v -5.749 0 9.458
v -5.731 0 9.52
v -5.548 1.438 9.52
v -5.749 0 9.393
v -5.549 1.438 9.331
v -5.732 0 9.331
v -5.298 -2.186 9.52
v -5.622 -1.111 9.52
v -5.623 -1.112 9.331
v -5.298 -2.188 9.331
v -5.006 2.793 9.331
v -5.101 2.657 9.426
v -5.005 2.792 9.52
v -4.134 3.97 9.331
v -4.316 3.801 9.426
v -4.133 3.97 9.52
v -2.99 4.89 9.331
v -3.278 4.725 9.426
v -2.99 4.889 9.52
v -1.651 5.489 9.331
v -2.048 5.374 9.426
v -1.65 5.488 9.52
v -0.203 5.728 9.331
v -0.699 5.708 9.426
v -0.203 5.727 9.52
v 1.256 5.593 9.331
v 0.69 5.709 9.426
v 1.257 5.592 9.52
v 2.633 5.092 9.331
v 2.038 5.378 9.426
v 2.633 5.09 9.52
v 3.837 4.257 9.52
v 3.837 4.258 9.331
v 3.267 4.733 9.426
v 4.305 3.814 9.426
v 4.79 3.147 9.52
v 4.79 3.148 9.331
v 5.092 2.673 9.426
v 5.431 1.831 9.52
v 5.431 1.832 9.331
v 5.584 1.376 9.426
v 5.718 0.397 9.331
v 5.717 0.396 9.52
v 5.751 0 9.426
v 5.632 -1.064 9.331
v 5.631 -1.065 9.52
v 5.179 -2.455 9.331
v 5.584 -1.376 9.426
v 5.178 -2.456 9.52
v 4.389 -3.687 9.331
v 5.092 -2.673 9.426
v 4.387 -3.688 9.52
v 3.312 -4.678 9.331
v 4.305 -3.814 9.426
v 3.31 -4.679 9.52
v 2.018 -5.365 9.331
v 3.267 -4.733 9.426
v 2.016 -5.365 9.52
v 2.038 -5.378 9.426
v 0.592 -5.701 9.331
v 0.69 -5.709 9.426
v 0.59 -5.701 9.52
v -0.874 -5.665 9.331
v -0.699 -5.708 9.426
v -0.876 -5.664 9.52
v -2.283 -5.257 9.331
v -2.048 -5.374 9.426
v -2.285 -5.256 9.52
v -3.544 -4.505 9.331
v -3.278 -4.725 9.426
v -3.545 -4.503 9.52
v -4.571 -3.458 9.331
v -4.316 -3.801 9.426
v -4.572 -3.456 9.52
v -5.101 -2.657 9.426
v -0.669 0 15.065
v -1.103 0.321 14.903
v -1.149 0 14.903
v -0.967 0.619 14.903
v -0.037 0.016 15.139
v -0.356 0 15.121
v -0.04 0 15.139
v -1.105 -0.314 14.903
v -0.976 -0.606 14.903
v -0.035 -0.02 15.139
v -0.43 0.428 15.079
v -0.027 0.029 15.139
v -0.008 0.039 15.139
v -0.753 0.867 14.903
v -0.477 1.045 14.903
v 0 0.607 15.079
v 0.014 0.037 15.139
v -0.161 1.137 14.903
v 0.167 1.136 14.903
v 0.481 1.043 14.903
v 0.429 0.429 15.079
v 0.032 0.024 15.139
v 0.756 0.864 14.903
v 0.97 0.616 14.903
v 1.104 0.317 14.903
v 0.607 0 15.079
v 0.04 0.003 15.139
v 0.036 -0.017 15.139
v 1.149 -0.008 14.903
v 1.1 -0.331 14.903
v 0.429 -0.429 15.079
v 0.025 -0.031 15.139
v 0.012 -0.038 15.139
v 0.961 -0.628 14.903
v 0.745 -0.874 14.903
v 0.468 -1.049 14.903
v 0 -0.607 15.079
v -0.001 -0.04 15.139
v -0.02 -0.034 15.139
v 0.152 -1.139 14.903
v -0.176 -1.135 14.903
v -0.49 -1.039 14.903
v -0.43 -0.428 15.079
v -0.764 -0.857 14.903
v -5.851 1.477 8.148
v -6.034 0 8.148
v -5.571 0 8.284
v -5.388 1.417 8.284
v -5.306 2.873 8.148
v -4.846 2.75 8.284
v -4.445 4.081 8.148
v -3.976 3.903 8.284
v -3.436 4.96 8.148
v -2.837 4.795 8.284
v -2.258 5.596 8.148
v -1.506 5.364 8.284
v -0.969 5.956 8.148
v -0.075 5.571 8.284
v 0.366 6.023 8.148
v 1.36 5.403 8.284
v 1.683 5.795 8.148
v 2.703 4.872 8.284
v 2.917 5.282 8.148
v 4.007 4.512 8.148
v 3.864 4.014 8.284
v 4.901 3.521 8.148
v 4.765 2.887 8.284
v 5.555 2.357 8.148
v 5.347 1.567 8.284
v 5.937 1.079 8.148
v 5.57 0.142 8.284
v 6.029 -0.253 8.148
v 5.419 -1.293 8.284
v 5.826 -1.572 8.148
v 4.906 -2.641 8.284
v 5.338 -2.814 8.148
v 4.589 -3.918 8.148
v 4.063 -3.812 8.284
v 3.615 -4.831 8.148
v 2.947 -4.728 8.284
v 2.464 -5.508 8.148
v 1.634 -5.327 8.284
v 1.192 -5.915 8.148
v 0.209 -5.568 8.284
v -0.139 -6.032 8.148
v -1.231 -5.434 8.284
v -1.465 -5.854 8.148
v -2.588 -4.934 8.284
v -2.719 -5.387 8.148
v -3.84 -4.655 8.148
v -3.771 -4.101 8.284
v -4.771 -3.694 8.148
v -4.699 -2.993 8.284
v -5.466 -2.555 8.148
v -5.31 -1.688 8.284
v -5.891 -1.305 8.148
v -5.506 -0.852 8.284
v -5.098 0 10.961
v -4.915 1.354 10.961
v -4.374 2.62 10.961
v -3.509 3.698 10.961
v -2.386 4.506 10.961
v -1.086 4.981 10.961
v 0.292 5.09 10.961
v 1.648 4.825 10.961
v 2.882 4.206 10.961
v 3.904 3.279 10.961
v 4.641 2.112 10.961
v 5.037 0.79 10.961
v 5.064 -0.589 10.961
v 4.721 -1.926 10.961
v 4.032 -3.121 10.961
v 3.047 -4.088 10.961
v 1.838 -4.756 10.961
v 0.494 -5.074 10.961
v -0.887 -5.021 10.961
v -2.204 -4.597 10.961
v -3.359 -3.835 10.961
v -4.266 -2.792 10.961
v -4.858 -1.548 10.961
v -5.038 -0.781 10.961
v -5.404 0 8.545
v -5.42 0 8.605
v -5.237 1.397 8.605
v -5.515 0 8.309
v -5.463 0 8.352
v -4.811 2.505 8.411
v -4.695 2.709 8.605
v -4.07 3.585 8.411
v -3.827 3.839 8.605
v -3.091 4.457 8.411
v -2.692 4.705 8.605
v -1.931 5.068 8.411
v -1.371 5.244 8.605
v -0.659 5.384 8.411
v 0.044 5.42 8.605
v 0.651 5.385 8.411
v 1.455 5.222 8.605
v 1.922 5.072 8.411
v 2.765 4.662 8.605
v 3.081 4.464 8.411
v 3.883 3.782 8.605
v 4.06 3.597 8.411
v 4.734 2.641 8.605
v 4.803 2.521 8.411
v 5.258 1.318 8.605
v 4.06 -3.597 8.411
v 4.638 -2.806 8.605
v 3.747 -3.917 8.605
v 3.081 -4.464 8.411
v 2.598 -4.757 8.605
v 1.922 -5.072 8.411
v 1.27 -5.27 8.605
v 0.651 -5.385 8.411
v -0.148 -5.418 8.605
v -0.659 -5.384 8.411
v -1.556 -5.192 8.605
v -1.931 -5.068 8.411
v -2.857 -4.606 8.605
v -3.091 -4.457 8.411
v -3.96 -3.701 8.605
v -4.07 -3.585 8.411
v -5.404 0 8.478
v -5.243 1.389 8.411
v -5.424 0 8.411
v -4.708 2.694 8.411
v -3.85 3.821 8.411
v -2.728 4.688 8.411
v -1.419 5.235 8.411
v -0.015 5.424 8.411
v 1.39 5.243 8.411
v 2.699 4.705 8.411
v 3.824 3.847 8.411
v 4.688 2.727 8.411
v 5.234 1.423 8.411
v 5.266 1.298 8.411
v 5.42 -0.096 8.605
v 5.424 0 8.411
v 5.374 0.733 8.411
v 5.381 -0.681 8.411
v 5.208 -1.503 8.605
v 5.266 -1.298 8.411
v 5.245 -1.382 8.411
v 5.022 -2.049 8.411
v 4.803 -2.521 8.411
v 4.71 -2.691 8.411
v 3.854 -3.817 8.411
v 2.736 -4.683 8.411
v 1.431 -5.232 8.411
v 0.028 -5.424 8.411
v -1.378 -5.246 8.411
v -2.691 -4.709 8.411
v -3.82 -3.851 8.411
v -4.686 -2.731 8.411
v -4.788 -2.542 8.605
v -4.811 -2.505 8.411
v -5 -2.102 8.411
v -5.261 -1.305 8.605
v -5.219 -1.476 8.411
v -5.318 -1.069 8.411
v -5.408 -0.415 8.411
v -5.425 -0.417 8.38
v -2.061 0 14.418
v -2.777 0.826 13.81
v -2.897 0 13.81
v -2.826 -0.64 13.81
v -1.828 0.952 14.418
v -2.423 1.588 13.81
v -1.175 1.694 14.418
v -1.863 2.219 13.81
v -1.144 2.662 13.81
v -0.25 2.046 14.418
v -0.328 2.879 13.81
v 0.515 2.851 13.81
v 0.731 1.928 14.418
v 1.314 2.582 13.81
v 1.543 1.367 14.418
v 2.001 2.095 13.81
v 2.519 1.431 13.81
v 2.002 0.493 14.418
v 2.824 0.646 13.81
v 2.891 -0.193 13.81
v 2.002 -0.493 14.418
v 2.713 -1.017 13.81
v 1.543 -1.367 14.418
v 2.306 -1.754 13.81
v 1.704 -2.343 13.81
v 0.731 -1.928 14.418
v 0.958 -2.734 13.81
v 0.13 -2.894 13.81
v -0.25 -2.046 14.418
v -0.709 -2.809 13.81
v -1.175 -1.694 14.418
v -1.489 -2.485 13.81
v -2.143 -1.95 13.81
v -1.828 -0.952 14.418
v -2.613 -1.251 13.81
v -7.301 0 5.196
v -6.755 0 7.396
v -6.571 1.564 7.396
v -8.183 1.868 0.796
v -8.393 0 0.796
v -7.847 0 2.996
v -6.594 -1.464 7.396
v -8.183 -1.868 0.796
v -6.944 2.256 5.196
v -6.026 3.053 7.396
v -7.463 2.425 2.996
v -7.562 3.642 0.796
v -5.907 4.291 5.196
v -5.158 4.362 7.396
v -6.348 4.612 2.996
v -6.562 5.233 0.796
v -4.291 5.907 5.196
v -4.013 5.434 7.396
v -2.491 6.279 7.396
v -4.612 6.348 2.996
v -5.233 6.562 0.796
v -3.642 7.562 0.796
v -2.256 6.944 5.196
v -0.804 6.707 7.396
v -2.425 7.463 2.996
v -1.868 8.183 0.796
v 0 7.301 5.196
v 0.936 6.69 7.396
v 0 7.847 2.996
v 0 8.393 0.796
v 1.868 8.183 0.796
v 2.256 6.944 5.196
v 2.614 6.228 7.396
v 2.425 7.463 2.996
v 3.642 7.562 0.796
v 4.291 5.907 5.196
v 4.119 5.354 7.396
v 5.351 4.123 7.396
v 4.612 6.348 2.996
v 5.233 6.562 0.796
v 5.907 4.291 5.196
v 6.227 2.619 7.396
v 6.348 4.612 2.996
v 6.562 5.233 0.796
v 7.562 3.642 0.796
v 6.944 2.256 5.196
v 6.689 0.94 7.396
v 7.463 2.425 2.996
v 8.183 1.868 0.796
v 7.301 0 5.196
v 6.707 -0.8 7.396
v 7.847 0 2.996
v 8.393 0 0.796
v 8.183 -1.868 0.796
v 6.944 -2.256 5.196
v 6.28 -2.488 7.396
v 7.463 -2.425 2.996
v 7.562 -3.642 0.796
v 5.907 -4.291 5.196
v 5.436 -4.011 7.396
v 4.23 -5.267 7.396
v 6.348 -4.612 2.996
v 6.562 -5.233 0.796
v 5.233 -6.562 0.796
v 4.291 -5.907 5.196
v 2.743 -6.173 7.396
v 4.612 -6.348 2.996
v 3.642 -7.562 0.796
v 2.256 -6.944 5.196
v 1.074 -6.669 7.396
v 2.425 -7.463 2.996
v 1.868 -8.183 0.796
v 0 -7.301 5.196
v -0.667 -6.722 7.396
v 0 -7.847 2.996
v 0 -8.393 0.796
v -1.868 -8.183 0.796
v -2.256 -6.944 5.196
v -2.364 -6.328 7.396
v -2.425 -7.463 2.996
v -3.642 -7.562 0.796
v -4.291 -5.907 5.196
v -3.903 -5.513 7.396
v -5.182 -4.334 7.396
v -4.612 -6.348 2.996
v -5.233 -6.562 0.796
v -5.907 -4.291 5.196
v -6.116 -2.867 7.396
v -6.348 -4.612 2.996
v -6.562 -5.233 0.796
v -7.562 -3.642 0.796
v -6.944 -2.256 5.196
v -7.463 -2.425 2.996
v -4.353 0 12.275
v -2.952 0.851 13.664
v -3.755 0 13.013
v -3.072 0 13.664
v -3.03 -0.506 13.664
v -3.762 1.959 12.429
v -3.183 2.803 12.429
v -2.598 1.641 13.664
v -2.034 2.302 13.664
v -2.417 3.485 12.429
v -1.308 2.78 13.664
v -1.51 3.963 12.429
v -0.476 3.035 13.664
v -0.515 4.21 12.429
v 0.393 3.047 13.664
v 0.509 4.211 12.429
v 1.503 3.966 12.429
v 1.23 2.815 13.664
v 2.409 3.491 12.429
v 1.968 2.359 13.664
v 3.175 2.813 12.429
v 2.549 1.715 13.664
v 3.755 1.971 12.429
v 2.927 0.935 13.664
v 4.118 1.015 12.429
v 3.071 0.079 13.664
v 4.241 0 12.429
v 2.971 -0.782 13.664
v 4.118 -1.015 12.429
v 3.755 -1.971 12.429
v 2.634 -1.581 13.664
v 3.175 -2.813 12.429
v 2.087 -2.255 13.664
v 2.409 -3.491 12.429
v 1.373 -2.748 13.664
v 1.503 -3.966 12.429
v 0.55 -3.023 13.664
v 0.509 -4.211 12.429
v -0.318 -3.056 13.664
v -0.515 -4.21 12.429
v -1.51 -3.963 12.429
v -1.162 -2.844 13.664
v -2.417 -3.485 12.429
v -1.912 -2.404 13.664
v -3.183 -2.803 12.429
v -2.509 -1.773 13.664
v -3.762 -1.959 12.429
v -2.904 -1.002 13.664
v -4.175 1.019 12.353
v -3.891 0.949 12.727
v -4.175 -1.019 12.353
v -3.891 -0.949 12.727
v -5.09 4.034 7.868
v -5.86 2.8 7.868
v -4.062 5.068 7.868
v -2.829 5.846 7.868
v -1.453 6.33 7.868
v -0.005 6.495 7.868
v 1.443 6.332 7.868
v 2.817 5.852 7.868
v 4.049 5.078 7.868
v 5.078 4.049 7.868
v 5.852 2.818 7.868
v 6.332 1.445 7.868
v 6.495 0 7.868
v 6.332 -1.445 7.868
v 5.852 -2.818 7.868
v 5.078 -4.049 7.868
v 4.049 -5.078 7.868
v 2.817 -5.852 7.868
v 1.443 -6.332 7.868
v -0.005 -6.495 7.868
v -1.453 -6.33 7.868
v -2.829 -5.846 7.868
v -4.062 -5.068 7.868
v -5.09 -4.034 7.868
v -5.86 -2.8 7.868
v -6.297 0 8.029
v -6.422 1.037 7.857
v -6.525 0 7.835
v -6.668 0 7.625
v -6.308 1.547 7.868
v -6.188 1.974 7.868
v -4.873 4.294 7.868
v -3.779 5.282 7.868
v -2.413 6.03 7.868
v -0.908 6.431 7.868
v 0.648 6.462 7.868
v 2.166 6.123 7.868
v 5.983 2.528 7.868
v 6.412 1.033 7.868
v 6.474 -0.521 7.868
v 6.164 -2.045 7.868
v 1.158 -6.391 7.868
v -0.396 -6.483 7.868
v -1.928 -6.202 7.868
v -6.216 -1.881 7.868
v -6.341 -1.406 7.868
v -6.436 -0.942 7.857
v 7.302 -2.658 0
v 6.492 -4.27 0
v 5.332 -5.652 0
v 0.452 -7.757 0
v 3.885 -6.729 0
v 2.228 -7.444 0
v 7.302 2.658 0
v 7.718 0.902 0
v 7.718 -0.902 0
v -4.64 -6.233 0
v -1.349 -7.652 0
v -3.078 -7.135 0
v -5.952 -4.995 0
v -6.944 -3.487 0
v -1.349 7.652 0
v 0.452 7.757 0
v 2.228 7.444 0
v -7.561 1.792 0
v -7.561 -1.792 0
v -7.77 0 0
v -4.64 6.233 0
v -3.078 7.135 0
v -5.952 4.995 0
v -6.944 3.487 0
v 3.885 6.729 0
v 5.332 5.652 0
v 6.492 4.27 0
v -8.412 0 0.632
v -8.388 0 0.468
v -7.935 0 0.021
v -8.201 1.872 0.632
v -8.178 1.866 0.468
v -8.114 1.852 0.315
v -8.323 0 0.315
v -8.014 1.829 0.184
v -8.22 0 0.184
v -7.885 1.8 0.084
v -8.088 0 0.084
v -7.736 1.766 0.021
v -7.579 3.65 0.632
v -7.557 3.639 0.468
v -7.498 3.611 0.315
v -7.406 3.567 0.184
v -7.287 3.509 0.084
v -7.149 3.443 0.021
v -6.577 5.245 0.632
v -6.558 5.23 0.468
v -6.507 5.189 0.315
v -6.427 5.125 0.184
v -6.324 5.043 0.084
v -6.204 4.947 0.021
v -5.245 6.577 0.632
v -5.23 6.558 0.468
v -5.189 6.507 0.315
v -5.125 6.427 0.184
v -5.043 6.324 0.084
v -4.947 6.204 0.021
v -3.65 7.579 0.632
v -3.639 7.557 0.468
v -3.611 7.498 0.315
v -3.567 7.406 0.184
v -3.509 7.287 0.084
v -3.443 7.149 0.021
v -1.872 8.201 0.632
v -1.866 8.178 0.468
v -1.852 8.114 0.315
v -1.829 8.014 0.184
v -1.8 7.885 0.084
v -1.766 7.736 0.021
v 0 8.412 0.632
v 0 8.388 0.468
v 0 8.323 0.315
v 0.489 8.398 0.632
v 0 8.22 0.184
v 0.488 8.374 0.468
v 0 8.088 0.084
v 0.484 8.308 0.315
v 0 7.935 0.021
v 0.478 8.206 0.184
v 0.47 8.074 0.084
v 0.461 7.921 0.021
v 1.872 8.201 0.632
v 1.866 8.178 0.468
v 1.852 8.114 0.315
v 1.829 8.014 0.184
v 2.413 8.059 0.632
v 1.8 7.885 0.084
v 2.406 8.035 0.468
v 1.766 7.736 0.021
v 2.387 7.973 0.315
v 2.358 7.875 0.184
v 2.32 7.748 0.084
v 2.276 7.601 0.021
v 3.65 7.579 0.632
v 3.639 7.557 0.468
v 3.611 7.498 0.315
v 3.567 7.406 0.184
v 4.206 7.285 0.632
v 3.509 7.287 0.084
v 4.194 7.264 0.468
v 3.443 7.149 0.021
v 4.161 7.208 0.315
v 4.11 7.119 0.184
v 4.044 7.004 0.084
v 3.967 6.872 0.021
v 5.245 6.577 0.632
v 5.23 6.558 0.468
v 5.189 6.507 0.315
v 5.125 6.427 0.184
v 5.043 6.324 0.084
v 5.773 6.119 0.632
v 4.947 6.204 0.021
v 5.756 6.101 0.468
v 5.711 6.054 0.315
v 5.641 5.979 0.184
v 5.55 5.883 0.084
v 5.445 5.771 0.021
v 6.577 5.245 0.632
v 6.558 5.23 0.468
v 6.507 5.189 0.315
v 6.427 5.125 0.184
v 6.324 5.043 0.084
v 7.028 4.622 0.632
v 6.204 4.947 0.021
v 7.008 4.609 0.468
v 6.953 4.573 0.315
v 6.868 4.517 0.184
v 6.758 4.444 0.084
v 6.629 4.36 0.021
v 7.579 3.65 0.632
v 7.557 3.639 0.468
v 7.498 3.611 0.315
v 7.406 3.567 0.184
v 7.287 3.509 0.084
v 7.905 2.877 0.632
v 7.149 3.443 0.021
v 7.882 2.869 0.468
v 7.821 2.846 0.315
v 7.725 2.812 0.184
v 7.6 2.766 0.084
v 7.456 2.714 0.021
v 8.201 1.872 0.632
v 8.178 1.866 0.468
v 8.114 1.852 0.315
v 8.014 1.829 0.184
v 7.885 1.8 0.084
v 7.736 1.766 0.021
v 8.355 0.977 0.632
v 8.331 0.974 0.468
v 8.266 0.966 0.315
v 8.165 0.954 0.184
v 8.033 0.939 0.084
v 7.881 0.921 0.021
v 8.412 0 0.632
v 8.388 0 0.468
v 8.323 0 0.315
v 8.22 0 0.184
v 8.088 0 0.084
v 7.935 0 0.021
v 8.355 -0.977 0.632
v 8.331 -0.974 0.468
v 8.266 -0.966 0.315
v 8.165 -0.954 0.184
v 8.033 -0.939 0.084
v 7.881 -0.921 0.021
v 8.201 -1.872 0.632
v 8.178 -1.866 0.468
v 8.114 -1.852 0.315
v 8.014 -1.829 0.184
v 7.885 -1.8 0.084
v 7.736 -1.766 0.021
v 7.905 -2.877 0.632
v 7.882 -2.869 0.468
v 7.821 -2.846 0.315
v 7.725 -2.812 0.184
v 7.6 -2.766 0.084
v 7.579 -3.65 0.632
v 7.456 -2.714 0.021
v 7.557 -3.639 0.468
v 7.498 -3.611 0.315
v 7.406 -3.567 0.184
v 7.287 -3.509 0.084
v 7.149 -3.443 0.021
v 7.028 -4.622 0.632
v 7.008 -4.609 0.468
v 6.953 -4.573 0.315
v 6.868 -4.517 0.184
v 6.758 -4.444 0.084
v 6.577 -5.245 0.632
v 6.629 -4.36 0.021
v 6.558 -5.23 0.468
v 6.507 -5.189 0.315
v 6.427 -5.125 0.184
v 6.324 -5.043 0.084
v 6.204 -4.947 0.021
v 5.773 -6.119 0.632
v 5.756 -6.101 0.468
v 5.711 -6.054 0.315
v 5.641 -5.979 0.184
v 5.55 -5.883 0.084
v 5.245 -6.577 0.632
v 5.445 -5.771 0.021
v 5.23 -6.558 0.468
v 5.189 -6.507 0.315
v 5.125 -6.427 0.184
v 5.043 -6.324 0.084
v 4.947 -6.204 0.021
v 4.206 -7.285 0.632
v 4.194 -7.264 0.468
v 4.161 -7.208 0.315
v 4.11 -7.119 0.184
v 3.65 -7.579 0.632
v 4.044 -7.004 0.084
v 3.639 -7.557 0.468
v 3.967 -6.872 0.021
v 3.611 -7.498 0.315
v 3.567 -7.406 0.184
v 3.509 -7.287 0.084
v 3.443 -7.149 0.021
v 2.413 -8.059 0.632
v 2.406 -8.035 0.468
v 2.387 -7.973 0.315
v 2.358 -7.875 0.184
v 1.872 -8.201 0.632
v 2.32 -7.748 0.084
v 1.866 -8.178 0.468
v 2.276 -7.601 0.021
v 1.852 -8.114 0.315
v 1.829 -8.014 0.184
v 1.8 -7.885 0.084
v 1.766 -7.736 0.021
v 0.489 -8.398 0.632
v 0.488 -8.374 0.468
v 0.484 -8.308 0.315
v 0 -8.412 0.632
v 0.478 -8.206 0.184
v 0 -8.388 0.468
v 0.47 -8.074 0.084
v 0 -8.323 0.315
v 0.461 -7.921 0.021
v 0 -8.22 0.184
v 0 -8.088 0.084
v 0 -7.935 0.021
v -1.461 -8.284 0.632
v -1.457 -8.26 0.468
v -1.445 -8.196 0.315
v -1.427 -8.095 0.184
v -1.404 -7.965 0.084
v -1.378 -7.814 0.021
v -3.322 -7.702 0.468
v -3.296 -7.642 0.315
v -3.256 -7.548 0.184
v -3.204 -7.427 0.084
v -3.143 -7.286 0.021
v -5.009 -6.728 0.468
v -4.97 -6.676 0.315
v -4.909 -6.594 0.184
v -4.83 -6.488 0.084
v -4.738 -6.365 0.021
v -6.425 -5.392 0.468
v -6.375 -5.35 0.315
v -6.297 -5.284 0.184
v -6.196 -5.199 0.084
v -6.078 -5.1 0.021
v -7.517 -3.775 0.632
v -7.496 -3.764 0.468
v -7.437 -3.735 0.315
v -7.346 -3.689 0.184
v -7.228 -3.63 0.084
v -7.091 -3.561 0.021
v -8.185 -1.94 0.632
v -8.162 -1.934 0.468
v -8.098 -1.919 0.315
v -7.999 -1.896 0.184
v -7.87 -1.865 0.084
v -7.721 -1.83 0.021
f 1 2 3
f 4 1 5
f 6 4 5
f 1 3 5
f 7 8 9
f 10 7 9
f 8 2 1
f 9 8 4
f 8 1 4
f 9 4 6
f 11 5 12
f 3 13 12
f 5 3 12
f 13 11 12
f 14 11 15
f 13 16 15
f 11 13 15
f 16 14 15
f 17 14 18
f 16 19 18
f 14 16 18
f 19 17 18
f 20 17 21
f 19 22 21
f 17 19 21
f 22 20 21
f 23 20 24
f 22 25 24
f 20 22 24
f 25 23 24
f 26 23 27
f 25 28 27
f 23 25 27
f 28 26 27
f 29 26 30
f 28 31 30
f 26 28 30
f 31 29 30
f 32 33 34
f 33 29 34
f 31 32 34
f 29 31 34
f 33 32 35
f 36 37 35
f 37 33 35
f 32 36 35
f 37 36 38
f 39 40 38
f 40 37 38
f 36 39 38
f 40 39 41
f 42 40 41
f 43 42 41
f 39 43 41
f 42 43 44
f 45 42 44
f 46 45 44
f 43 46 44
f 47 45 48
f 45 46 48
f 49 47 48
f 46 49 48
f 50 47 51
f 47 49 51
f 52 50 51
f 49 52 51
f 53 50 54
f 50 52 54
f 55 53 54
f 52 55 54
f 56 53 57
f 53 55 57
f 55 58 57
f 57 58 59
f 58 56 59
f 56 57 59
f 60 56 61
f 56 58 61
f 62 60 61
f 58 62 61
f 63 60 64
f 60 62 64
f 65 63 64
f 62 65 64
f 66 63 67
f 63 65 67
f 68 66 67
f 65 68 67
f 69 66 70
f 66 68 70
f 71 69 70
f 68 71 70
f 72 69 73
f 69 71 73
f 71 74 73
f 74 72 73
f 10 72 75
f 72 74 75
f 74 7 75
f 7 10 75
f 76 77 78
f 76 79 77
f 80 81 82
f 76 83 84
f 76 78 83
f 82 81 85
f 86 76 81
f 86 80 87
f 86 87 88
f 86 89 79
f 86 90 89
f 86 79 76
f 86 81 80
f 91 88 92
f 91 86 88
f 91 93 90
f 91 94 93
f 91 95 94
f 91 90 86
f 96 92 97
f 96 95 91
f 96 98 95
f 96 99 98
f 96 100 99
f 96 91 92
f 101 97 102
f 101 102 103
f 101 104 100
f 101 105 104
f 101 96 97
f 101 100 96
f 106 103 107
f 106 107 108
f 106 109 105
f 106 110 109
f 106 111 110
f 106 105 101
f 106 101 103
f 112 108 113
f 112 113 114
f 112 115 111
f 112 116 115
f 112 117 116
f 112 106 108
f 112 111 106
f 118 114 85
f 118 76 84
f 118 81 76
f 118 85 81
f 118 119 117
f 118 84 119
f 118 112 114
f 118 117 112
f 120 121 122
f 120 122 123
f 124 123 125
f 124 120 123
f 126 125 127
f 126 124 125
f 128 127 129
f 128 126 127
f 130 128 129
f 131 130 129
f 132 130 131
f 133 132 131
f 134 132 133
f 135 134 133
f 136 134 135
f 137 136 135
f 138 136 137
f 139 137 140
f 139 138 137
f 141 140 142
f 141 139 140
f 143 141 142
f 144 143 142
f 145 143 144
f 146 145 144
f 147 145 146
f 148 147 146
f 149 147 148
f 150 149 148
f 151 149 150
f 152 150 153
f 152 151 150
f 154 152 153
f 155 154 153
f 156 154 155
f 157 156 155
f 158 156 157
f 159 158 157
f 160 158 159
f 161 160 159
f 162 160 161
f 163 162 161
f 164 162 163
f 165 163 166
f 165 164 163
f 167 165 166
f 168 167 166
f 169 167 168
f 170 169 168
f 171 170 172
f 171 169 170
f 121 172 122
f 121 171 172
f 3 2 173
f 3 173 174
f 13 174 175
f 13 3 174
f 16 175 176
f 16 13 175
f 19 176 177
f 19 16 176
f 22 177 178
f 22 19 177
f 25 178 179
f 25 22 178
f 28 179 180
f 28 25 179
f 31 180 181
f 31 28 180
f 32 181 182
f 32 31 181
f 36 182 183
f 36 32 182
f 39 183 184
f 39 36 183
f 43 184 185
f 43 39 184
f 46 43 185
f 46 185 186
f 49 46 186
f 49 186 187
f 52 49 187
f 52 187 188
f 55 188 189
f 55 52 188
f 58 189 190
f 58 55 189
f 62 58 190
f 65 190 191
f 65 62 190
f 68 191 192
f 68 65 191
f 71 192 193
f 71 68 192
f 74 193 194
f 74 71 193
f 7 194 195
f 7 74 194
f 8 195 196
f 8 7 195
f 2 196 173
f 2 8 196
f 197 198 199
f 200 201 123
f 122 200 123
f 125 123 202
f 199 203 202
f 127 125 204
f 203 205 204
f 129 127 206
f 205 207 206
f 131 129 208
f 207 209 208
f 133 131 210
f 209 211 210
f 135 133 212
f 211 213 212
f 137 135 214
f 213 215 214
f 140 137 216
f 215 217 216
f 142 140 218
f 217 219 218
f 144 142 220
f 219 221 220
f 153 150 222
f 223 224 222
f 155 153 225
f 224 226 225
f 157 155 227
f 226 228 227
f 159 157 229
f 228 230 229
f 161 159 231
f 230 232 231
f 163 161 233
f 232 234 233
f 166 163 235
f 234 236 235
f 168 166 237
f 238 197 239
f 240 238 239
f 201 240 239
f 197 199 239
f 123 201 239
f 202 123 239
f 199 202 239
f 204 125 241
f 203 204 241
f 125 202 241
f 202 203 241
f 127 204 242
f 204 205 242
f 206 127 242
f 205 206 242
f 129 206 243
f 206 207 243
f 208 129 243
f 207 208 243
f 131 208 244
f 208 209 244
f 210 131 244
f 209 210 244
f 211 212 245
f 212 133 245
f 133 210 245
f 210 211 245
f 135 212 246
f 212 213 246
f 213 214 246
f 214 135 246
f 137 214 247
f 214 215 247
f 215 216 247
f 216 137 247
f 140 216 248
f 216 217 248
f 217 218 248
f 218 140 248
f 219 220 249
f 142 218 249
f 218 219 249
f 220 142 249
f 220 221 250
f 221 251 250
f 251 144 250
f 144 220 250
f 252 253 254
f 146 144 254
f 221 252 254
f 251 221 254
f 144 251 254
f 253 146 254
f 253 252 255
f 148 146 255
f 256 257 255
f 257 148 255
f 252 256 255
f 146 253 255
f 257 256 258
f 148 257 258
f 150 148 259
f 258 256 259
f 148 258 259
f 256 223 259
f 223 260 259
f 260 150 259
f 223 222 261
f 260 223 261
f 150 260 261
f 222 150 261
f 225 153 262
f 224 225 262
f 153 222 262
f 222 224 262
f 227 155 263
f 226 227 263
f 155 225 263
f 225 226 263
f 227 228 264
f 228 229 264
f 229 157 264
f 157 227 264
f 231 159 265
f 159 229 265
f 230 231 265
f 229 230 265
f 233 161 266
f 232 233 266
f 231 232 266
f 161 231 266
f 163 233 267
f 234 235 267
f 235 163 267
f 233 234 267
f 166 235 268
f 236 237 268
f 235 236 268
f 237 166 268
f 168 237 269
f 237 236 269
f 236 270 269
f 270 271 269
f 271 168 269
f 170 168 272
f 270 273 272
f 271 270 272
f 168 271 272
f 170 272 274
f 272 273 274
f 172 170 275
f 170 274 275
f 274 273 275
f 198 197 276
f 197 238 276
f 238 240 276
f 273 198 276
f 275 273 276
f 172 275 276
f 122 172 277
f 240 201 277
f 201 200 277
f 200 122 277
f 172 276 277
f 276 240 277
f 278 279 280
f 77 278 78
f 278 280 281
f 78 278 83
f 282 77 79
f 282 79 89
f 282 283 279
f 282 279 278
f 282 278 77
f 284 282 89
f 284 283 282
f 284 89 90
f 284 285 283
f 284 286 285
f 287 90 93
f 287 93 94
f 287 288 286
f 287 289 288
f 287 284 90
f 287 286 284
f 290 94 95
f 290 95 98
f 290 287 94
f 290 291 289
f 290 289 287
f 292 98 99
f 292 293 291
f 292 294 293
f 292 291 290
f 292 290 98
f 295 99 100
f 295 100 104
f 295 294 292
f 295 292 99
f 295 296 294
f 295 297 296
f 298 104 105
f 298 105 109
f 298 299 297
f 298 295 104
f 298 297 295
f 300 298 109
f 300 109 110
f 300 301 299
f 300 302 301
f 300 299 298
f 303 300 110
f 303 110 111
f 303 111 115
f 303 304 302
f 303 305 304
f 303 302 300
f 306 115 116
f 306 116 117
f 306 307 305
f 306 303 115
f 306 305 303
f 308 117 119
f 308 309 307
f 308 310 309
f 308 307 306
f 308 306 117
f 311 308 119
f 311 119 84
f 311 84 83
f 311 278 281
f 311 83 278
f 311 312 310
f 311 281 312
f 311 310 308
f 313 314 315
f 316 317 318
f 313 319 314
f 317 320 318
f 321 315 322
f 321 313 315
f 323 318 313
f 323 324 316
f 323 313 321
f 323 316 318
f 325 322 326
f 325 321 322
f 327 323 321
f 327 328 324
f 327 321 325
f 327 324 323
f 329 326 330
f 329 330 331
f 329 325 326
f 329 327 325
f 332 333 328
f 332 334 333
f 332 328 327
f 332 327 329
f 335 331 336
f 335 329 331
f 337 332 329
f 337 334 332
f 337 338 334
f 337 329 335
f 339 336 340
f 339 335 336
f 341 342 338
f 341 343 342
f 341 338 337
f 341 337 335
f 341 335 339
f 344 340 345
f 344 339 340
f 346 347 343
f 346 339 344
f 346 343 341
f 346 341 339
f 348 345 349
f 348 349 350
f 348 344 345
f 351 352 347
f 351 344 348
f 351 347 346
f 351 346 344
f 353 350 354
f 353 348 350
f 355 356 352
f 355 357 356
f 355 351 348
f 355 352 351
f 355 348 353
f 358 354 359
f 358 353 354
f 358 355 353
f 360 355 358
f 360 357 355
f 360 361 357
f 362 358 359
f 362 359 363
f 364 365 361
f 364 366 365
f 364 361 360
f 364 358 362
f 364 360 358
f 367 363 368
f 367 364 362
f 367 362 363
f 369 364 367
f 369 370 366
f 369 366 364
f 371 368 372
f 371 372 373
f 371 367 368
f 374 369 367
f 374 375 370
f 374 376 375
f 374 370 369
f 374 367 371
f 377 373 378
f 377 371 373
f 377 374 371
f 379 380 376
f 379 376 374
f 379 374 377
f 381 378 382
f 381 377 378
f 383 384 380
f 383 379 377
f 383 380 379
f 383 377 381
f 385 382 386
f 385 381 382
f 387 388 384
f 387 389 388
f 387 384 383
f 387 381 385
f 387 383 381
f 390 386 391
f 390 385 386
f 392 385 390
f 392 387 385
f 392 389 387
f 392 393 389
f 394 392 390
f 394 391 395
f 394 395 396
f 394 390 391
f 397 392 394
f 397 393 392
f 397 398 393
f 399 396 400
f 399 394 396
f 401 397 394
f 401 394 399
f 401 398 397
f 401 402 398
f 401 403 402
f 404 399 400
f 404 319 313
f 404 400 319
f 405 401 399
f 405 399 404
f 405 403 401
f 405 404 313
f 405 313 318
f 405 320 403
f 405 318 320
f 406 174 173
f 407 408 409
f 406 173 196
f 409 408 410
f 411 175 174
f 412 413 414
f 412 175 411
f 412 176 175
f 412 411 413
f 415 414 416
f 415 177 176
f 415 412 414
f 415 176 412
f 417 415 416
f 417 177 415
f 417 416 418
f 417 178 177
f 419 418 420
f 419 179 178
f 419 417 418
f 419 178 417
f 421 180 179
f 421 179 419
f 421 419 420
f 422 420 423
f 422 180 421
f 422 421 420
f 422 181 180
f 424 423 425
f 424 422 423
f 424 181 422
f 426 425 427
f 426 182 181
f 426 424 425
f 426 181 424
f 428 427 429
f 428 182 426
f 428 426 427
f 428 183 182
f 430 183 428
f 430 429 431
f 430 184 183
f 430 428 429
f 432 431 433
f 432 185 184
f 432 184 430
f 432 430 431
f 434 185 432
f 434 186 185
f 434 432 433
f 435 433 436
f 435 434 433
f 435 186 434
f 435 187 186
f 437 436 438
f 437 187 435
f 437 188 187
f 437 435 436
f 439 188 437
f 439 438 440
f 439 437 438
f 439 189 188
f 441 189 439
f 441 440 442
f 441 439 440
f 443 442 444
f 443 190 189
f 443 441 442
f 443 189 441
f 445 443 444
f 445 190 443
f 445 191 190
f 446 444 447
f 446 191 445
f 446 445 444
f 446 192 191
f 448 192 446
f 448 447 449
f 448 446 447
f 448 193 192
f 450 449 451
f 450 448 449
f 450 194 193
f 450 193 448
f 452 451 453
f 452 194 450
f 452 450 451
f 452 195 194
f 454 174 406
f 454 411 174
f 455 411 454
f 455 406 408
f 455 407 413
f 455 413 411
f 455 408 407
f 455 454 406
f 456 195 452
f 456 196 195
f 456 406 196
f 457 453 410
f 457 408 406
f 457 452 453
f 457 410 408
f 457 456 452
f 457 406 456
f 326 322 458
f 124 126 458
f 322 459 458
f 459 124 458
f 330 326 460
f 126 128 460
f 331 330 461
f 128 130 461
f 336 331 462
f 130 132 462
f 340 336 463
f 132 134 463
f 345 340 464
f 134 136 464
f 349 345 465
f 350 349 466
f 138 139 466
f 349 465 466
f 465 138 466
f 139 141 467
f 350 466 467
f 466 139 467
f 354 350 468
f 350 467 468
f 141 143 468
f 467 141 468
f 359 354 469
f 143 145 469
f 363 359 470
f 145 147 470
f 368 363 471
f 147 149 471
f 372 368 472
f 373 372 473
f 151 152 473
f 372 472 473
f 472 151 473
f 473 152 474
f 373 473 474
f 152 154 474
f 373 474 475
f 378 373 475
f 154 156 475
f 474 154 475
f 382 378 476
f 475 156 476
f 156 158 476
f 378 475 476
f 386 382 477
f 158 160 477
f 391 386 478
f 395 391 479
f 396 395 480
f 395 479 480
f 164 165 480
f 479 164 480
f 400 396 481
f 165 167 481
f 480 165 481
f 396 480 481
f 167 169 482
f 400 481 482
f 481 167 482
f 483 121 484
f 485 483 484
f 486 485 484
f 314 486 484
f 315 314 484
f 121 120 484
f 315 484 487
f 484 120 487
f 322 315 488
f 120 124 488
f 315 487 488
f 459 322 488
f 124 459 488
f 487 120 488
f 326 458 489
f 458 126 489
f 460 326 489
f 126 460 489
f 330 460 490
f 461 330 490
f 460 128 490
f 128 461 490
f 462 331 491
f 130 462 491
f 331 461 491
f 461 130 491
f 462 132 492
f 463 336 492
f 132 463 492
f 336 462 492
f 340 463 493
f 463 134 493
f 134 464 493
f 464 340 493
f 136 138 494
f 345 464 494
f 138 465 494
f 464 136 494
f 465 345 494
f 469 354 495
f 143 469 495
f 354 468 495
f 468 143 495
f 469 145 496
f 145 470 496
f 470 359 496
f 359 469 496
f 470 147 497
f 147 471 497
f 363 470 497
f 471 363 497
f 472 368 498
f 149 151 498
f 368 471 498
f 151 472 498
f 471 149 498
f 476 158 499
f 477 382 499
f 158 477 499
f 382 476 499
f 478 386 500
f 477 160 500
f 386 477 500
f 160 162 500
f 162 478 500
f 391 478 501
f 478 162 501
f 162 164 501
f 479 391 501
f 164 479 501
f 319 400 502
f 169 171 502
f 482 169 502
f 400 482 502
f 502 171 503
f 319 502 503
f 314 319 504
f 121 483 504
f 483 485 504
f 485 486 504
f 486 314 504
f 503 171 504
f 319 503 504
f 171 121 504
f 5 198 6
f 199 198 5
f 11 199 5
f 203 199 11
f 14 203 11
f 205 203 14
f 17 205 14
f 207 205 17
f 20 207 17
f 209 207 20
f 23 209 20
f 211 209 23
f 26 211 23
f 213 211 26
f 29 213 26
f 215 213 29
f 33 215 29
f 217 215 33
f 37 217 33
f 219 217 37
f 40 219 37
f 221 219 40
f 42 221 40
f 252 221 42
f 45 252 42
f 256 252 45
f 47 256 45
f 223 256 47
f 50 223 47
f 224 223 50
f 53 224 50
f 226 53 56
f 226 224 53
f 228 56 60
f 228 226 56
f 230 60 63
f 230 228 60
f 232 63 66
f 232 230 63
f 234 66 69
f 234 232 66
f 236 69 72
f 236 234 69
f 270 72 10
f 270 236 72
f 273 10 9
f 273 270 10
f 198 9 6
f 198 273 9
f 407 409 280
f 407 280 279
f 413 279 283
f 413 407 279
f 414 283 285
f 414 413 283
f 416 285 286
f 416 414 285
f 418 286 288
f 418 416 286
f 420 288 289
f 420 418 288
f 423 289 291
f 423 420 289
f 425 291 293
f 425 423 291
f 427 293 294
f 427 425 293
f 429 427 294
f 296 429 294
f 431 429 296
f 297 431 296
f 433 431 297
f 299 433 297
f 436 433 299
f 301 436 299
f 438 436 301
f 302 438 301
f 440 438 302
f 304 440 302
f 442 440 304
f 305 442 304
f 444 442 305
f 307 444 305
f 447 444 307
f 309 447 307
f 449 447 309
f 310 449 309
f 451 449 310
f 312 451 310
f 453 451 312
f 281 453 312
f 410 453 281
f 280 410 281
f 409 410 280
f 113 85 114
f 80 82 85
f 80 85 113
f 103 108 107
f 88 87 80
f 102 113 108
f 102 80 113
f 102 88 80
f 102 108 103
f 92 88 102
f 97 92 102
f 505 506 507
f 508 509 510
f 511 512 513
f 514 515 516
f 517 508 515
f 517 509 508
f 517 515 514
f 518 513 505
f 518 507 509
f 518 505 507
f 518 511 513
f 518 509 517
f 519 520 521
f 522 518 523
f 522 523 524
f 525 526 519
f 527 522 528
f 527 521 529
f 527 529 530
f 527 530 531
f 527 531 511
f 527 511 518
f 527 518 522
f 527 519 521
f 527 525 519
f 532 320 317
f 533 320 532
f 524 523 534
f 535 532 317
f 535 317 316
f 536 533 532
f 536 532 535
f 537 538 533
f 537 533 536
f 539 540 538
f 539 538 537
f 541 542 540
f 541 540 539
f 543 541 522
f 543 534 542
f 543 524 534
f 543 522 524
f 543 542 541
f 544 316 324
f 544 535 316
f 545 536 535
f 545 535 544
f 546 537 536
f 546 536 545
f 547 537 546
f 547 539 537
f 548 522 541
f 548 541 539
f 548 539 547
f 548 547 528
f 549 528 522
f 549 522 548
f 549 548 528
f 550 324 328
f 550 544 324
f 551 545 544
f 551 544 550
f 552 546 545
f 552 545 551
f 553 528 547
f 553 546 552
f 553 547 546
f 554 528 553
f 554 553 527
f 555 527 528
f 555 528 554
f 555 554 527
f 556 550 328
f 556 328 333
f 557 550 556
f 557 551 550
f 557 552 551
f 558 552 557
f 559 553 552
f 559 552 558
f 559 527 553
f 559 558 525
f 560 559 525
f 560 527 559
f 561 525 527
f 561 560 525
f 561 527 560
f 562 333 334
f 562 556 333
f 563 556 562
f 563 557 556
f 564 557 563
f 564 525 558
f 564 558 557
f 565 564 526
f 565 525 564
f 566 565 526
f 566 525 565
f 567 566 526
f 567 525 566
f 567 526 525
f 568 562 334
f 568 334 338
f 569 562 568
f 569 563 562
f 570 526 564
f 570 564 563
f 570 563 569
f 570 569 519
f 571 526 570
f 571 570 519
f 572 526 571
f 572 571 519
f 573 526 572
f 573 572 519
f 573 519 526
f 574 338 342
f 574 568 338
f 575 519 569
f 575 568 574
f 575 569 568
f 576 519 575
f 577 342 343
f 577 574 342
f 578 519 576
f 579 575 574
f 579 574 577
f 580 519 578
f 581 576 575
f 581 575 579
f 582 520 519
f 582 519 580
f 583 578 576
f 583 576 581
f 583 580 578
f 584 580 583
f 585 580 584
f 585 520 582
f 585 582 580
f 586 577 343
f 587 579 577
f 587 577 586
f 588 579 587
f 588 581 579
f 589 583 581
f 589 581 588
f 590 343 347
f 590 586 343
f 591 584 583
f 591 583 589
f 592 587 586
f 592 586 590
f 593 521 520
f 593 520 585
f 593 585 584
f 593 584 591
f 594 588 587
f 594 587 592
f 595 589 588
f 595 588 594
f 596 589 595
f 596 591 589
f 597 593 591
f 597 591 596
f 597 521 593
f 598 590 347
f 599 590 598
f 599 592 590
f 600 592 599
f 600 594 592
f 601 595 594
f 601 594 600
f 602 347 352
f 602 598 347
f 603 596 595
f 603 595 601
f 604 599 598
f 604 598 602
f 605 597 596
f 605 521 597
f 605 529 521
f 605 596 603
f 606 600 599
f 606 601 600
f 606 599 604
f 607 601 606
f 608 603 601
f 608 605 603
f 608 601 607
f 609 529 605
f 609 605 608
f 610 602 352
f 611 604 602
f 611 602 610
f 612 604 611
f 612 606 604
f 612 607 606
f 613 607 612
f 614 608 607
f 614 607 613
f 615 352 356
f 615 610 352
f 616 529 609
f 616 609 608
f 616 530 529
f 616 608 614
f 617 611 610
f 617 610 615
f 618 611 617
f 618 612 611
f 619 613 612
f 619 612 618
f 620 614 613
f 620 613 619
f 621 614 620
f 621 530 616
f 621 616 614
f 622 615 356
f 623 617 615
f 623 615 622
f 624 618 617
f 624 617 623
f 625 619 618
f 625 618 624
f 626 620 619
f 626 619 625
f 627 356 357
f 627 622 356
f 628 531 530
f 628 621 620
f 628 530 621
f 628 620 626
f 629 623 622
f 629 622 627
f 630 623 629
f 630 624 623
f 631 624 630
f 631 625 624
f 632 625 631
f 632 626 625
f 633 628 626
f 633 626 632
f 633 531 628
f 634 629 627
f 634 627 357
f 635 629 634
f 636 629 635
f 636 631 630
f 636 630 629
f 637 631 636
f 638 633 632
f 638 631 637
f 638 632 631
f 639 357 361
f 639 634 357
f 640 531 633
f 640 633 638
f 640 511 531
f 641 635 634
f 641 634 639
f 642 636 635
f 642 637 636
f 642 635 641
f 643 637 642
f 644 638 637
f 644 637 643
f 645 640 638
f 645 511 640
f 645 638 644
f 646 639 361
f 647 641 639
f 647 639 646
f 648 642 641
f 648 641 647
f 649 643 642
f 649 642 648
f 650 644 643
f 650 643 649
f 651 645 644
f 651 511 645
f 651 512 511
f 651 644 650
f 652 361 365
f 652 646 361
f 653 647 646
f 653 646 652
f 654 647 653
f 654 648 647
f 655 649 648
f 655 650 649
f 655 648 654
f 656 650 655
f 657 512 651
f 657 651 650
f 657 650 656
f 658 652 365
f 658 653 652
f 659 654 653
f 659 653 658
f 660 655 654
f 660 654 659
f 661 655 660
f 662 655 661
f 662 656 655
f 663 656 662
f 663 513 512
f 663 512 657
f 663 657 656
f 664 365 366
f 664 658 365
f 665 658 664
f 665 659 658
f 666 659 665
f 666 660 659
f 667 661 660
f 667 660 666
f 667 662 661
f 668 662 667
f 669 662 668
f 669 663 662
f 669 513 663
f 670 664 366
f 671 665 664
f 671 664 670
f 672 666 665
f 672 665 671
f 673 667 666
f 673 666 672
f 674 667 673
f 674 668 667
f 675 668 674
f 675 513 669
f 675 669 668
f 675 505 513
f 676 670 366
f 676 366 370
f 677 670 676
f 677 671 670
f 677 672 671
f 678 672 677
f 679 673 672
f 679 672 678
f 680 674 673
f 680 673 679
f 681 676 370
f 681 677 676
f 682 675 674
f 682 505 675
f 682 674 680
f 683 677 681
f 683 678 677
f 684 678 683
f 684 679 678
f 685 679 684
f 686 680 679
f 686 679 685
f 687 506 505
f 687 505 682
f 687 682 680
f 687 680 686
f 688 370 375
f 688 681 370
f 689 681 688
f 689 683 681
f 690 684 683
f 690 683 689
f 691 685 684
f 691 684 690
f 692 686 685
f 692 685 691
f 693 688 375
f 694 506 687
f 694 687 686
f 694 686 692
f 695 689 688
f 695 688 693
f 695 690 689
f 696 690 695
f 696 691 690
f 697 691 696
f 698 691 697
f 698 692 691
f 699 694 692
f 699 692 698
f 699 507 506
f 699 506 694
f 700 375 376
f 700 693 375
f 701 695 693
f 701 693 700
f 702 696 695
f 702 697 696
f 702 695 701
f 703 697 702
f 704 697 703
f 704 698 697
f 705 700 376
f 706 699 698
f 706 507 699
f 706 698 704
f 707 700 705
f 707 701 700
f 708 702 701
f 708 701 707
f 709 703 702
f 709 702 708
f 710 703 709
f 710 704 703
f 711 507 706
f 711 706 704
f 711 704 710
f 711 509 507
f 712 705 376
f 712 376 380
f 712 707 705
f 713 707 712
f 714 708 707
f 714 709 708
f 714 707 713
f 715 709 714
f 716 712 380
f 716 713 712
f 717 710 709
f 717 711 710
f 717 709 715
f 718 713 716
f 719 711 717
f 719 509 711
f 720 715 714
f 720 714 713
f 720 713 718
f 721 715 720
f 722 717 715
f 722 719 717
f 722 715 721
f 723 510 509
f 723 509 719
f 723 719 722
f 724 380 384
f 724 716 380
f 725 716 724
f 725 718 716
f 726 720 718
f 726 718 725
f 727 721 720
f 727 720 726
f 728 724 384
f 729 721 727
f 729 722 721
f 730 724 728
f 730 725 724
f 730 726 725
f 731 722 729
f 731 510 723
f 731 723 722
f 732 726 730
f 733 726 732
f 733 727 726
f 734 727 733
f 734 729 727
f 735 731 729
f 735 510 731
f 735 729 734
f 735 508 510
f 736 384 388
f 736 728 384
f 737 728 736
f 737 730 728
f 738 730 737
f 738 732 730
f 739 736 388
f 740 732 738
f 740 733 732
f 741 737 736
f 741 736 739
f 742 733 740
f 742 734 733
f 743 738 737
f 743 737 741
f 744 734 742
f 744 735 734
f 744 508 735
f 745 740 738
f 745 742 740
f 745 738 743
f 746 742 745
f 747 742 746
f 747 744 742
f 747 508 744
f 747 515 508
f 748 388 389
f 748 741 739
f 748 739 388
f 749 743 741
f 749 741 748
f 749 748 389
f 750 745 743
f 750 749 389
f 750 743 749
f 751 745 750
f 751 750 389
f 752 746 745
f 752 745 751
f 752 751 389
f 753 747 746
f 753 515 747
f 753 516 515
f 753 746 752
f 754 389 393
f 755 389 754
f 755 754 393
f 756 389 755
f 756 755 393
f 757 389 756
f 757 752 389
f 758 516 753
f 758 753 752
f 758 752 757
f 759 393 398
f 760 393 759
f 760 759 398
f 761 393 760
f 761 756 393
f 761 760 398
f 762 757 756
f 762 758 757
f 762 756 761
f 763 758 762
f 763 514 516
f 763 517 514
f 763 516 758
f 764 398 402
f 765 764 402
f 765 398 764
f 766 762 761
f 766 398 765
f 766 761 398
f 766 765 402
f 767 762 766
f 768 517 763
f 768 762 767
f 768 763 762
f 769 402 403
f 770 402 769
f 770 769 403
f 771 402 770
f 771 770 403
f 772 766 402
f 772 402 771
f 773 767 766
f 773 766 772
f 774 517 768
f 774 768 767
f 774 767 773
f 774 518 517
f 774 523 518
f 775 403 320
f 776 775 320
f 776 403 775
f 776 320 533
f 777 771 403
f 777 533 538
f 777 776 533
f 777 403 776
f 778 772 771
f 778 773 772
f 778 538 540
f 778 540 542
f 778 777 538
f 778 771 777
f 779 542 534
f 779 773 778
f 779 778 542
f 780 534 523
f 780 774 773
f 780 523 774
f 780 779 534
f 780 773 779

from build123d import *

# Parameters (mm, degrees)
F2_R = 0.2370016828
F3_R = 1.0472005339
F4_R = 7.4210847051
F5_R = 2.7246047928
F6_R = 0.6418579552


with BuildPart() as f1:
    # F0 (on Front) → F1 (revolve)
    with BuildSketch(Plane.XZ):
        Polygon((-8.590772748, 0), (0, 0), (0, 15.1389241219), (-0.5925893784, 15.1389241219), (-2.0398800261, 14.5295374095), (-4.4012479484, 12.5490352511), (-5.7723652571, 9.4259344041), (-5.3153261542, 8.3595104516), (-6.6102705896, 7.978644222), align=None)
    revolve(axis=Axis((0, 0, 7.5694620609), (0, 0, -1)))

    # F2
    f2_edges = [f1.edges().sort_by_distance(p)[0] for p in [
        (5.772365, 0, 9.425934),
        (5.315326, 0, 8.35951),
        (-5.543846, 0, 8.892722),
    ]]
    fillet(f2_edges, radius=F2_R)

    # F3
    f3_edges = [f1.edges().sort_by_distance(p)[0] for p in [
        (6.610271, 0, 7.978644),
    ]]
    fillet(f3_edges, radius=F3_R)

    # F4
    f4_edges = [f1.edges().sort_by_distance(p)[0] for p in [
        (2.03988, 0, 14.529537),
        (4.401248, 0, 12.549035),
        (-3.220564, 0, 13.539286),
    ]]
    fillet(f4_edges, radius=F4_R)

    # F5
    f5_edges = [f1.edges().sort_by_distance(p)[0] for p in [
        (-0.800472, 0, 15.051394),
        (1.008351, 0, 14.963864),
        (0.592589, 0, 15.138924),
    ]]
    fillet(f5_edges, radius=F5_R)

    # F6
    f6_edges = [f1.edges().sort_by_distance(p)[0] for p in [
        (8.590773, 0, 0),
    ]]
    fillet(f6_edges, radius=F6_R)


solid = f1.part
